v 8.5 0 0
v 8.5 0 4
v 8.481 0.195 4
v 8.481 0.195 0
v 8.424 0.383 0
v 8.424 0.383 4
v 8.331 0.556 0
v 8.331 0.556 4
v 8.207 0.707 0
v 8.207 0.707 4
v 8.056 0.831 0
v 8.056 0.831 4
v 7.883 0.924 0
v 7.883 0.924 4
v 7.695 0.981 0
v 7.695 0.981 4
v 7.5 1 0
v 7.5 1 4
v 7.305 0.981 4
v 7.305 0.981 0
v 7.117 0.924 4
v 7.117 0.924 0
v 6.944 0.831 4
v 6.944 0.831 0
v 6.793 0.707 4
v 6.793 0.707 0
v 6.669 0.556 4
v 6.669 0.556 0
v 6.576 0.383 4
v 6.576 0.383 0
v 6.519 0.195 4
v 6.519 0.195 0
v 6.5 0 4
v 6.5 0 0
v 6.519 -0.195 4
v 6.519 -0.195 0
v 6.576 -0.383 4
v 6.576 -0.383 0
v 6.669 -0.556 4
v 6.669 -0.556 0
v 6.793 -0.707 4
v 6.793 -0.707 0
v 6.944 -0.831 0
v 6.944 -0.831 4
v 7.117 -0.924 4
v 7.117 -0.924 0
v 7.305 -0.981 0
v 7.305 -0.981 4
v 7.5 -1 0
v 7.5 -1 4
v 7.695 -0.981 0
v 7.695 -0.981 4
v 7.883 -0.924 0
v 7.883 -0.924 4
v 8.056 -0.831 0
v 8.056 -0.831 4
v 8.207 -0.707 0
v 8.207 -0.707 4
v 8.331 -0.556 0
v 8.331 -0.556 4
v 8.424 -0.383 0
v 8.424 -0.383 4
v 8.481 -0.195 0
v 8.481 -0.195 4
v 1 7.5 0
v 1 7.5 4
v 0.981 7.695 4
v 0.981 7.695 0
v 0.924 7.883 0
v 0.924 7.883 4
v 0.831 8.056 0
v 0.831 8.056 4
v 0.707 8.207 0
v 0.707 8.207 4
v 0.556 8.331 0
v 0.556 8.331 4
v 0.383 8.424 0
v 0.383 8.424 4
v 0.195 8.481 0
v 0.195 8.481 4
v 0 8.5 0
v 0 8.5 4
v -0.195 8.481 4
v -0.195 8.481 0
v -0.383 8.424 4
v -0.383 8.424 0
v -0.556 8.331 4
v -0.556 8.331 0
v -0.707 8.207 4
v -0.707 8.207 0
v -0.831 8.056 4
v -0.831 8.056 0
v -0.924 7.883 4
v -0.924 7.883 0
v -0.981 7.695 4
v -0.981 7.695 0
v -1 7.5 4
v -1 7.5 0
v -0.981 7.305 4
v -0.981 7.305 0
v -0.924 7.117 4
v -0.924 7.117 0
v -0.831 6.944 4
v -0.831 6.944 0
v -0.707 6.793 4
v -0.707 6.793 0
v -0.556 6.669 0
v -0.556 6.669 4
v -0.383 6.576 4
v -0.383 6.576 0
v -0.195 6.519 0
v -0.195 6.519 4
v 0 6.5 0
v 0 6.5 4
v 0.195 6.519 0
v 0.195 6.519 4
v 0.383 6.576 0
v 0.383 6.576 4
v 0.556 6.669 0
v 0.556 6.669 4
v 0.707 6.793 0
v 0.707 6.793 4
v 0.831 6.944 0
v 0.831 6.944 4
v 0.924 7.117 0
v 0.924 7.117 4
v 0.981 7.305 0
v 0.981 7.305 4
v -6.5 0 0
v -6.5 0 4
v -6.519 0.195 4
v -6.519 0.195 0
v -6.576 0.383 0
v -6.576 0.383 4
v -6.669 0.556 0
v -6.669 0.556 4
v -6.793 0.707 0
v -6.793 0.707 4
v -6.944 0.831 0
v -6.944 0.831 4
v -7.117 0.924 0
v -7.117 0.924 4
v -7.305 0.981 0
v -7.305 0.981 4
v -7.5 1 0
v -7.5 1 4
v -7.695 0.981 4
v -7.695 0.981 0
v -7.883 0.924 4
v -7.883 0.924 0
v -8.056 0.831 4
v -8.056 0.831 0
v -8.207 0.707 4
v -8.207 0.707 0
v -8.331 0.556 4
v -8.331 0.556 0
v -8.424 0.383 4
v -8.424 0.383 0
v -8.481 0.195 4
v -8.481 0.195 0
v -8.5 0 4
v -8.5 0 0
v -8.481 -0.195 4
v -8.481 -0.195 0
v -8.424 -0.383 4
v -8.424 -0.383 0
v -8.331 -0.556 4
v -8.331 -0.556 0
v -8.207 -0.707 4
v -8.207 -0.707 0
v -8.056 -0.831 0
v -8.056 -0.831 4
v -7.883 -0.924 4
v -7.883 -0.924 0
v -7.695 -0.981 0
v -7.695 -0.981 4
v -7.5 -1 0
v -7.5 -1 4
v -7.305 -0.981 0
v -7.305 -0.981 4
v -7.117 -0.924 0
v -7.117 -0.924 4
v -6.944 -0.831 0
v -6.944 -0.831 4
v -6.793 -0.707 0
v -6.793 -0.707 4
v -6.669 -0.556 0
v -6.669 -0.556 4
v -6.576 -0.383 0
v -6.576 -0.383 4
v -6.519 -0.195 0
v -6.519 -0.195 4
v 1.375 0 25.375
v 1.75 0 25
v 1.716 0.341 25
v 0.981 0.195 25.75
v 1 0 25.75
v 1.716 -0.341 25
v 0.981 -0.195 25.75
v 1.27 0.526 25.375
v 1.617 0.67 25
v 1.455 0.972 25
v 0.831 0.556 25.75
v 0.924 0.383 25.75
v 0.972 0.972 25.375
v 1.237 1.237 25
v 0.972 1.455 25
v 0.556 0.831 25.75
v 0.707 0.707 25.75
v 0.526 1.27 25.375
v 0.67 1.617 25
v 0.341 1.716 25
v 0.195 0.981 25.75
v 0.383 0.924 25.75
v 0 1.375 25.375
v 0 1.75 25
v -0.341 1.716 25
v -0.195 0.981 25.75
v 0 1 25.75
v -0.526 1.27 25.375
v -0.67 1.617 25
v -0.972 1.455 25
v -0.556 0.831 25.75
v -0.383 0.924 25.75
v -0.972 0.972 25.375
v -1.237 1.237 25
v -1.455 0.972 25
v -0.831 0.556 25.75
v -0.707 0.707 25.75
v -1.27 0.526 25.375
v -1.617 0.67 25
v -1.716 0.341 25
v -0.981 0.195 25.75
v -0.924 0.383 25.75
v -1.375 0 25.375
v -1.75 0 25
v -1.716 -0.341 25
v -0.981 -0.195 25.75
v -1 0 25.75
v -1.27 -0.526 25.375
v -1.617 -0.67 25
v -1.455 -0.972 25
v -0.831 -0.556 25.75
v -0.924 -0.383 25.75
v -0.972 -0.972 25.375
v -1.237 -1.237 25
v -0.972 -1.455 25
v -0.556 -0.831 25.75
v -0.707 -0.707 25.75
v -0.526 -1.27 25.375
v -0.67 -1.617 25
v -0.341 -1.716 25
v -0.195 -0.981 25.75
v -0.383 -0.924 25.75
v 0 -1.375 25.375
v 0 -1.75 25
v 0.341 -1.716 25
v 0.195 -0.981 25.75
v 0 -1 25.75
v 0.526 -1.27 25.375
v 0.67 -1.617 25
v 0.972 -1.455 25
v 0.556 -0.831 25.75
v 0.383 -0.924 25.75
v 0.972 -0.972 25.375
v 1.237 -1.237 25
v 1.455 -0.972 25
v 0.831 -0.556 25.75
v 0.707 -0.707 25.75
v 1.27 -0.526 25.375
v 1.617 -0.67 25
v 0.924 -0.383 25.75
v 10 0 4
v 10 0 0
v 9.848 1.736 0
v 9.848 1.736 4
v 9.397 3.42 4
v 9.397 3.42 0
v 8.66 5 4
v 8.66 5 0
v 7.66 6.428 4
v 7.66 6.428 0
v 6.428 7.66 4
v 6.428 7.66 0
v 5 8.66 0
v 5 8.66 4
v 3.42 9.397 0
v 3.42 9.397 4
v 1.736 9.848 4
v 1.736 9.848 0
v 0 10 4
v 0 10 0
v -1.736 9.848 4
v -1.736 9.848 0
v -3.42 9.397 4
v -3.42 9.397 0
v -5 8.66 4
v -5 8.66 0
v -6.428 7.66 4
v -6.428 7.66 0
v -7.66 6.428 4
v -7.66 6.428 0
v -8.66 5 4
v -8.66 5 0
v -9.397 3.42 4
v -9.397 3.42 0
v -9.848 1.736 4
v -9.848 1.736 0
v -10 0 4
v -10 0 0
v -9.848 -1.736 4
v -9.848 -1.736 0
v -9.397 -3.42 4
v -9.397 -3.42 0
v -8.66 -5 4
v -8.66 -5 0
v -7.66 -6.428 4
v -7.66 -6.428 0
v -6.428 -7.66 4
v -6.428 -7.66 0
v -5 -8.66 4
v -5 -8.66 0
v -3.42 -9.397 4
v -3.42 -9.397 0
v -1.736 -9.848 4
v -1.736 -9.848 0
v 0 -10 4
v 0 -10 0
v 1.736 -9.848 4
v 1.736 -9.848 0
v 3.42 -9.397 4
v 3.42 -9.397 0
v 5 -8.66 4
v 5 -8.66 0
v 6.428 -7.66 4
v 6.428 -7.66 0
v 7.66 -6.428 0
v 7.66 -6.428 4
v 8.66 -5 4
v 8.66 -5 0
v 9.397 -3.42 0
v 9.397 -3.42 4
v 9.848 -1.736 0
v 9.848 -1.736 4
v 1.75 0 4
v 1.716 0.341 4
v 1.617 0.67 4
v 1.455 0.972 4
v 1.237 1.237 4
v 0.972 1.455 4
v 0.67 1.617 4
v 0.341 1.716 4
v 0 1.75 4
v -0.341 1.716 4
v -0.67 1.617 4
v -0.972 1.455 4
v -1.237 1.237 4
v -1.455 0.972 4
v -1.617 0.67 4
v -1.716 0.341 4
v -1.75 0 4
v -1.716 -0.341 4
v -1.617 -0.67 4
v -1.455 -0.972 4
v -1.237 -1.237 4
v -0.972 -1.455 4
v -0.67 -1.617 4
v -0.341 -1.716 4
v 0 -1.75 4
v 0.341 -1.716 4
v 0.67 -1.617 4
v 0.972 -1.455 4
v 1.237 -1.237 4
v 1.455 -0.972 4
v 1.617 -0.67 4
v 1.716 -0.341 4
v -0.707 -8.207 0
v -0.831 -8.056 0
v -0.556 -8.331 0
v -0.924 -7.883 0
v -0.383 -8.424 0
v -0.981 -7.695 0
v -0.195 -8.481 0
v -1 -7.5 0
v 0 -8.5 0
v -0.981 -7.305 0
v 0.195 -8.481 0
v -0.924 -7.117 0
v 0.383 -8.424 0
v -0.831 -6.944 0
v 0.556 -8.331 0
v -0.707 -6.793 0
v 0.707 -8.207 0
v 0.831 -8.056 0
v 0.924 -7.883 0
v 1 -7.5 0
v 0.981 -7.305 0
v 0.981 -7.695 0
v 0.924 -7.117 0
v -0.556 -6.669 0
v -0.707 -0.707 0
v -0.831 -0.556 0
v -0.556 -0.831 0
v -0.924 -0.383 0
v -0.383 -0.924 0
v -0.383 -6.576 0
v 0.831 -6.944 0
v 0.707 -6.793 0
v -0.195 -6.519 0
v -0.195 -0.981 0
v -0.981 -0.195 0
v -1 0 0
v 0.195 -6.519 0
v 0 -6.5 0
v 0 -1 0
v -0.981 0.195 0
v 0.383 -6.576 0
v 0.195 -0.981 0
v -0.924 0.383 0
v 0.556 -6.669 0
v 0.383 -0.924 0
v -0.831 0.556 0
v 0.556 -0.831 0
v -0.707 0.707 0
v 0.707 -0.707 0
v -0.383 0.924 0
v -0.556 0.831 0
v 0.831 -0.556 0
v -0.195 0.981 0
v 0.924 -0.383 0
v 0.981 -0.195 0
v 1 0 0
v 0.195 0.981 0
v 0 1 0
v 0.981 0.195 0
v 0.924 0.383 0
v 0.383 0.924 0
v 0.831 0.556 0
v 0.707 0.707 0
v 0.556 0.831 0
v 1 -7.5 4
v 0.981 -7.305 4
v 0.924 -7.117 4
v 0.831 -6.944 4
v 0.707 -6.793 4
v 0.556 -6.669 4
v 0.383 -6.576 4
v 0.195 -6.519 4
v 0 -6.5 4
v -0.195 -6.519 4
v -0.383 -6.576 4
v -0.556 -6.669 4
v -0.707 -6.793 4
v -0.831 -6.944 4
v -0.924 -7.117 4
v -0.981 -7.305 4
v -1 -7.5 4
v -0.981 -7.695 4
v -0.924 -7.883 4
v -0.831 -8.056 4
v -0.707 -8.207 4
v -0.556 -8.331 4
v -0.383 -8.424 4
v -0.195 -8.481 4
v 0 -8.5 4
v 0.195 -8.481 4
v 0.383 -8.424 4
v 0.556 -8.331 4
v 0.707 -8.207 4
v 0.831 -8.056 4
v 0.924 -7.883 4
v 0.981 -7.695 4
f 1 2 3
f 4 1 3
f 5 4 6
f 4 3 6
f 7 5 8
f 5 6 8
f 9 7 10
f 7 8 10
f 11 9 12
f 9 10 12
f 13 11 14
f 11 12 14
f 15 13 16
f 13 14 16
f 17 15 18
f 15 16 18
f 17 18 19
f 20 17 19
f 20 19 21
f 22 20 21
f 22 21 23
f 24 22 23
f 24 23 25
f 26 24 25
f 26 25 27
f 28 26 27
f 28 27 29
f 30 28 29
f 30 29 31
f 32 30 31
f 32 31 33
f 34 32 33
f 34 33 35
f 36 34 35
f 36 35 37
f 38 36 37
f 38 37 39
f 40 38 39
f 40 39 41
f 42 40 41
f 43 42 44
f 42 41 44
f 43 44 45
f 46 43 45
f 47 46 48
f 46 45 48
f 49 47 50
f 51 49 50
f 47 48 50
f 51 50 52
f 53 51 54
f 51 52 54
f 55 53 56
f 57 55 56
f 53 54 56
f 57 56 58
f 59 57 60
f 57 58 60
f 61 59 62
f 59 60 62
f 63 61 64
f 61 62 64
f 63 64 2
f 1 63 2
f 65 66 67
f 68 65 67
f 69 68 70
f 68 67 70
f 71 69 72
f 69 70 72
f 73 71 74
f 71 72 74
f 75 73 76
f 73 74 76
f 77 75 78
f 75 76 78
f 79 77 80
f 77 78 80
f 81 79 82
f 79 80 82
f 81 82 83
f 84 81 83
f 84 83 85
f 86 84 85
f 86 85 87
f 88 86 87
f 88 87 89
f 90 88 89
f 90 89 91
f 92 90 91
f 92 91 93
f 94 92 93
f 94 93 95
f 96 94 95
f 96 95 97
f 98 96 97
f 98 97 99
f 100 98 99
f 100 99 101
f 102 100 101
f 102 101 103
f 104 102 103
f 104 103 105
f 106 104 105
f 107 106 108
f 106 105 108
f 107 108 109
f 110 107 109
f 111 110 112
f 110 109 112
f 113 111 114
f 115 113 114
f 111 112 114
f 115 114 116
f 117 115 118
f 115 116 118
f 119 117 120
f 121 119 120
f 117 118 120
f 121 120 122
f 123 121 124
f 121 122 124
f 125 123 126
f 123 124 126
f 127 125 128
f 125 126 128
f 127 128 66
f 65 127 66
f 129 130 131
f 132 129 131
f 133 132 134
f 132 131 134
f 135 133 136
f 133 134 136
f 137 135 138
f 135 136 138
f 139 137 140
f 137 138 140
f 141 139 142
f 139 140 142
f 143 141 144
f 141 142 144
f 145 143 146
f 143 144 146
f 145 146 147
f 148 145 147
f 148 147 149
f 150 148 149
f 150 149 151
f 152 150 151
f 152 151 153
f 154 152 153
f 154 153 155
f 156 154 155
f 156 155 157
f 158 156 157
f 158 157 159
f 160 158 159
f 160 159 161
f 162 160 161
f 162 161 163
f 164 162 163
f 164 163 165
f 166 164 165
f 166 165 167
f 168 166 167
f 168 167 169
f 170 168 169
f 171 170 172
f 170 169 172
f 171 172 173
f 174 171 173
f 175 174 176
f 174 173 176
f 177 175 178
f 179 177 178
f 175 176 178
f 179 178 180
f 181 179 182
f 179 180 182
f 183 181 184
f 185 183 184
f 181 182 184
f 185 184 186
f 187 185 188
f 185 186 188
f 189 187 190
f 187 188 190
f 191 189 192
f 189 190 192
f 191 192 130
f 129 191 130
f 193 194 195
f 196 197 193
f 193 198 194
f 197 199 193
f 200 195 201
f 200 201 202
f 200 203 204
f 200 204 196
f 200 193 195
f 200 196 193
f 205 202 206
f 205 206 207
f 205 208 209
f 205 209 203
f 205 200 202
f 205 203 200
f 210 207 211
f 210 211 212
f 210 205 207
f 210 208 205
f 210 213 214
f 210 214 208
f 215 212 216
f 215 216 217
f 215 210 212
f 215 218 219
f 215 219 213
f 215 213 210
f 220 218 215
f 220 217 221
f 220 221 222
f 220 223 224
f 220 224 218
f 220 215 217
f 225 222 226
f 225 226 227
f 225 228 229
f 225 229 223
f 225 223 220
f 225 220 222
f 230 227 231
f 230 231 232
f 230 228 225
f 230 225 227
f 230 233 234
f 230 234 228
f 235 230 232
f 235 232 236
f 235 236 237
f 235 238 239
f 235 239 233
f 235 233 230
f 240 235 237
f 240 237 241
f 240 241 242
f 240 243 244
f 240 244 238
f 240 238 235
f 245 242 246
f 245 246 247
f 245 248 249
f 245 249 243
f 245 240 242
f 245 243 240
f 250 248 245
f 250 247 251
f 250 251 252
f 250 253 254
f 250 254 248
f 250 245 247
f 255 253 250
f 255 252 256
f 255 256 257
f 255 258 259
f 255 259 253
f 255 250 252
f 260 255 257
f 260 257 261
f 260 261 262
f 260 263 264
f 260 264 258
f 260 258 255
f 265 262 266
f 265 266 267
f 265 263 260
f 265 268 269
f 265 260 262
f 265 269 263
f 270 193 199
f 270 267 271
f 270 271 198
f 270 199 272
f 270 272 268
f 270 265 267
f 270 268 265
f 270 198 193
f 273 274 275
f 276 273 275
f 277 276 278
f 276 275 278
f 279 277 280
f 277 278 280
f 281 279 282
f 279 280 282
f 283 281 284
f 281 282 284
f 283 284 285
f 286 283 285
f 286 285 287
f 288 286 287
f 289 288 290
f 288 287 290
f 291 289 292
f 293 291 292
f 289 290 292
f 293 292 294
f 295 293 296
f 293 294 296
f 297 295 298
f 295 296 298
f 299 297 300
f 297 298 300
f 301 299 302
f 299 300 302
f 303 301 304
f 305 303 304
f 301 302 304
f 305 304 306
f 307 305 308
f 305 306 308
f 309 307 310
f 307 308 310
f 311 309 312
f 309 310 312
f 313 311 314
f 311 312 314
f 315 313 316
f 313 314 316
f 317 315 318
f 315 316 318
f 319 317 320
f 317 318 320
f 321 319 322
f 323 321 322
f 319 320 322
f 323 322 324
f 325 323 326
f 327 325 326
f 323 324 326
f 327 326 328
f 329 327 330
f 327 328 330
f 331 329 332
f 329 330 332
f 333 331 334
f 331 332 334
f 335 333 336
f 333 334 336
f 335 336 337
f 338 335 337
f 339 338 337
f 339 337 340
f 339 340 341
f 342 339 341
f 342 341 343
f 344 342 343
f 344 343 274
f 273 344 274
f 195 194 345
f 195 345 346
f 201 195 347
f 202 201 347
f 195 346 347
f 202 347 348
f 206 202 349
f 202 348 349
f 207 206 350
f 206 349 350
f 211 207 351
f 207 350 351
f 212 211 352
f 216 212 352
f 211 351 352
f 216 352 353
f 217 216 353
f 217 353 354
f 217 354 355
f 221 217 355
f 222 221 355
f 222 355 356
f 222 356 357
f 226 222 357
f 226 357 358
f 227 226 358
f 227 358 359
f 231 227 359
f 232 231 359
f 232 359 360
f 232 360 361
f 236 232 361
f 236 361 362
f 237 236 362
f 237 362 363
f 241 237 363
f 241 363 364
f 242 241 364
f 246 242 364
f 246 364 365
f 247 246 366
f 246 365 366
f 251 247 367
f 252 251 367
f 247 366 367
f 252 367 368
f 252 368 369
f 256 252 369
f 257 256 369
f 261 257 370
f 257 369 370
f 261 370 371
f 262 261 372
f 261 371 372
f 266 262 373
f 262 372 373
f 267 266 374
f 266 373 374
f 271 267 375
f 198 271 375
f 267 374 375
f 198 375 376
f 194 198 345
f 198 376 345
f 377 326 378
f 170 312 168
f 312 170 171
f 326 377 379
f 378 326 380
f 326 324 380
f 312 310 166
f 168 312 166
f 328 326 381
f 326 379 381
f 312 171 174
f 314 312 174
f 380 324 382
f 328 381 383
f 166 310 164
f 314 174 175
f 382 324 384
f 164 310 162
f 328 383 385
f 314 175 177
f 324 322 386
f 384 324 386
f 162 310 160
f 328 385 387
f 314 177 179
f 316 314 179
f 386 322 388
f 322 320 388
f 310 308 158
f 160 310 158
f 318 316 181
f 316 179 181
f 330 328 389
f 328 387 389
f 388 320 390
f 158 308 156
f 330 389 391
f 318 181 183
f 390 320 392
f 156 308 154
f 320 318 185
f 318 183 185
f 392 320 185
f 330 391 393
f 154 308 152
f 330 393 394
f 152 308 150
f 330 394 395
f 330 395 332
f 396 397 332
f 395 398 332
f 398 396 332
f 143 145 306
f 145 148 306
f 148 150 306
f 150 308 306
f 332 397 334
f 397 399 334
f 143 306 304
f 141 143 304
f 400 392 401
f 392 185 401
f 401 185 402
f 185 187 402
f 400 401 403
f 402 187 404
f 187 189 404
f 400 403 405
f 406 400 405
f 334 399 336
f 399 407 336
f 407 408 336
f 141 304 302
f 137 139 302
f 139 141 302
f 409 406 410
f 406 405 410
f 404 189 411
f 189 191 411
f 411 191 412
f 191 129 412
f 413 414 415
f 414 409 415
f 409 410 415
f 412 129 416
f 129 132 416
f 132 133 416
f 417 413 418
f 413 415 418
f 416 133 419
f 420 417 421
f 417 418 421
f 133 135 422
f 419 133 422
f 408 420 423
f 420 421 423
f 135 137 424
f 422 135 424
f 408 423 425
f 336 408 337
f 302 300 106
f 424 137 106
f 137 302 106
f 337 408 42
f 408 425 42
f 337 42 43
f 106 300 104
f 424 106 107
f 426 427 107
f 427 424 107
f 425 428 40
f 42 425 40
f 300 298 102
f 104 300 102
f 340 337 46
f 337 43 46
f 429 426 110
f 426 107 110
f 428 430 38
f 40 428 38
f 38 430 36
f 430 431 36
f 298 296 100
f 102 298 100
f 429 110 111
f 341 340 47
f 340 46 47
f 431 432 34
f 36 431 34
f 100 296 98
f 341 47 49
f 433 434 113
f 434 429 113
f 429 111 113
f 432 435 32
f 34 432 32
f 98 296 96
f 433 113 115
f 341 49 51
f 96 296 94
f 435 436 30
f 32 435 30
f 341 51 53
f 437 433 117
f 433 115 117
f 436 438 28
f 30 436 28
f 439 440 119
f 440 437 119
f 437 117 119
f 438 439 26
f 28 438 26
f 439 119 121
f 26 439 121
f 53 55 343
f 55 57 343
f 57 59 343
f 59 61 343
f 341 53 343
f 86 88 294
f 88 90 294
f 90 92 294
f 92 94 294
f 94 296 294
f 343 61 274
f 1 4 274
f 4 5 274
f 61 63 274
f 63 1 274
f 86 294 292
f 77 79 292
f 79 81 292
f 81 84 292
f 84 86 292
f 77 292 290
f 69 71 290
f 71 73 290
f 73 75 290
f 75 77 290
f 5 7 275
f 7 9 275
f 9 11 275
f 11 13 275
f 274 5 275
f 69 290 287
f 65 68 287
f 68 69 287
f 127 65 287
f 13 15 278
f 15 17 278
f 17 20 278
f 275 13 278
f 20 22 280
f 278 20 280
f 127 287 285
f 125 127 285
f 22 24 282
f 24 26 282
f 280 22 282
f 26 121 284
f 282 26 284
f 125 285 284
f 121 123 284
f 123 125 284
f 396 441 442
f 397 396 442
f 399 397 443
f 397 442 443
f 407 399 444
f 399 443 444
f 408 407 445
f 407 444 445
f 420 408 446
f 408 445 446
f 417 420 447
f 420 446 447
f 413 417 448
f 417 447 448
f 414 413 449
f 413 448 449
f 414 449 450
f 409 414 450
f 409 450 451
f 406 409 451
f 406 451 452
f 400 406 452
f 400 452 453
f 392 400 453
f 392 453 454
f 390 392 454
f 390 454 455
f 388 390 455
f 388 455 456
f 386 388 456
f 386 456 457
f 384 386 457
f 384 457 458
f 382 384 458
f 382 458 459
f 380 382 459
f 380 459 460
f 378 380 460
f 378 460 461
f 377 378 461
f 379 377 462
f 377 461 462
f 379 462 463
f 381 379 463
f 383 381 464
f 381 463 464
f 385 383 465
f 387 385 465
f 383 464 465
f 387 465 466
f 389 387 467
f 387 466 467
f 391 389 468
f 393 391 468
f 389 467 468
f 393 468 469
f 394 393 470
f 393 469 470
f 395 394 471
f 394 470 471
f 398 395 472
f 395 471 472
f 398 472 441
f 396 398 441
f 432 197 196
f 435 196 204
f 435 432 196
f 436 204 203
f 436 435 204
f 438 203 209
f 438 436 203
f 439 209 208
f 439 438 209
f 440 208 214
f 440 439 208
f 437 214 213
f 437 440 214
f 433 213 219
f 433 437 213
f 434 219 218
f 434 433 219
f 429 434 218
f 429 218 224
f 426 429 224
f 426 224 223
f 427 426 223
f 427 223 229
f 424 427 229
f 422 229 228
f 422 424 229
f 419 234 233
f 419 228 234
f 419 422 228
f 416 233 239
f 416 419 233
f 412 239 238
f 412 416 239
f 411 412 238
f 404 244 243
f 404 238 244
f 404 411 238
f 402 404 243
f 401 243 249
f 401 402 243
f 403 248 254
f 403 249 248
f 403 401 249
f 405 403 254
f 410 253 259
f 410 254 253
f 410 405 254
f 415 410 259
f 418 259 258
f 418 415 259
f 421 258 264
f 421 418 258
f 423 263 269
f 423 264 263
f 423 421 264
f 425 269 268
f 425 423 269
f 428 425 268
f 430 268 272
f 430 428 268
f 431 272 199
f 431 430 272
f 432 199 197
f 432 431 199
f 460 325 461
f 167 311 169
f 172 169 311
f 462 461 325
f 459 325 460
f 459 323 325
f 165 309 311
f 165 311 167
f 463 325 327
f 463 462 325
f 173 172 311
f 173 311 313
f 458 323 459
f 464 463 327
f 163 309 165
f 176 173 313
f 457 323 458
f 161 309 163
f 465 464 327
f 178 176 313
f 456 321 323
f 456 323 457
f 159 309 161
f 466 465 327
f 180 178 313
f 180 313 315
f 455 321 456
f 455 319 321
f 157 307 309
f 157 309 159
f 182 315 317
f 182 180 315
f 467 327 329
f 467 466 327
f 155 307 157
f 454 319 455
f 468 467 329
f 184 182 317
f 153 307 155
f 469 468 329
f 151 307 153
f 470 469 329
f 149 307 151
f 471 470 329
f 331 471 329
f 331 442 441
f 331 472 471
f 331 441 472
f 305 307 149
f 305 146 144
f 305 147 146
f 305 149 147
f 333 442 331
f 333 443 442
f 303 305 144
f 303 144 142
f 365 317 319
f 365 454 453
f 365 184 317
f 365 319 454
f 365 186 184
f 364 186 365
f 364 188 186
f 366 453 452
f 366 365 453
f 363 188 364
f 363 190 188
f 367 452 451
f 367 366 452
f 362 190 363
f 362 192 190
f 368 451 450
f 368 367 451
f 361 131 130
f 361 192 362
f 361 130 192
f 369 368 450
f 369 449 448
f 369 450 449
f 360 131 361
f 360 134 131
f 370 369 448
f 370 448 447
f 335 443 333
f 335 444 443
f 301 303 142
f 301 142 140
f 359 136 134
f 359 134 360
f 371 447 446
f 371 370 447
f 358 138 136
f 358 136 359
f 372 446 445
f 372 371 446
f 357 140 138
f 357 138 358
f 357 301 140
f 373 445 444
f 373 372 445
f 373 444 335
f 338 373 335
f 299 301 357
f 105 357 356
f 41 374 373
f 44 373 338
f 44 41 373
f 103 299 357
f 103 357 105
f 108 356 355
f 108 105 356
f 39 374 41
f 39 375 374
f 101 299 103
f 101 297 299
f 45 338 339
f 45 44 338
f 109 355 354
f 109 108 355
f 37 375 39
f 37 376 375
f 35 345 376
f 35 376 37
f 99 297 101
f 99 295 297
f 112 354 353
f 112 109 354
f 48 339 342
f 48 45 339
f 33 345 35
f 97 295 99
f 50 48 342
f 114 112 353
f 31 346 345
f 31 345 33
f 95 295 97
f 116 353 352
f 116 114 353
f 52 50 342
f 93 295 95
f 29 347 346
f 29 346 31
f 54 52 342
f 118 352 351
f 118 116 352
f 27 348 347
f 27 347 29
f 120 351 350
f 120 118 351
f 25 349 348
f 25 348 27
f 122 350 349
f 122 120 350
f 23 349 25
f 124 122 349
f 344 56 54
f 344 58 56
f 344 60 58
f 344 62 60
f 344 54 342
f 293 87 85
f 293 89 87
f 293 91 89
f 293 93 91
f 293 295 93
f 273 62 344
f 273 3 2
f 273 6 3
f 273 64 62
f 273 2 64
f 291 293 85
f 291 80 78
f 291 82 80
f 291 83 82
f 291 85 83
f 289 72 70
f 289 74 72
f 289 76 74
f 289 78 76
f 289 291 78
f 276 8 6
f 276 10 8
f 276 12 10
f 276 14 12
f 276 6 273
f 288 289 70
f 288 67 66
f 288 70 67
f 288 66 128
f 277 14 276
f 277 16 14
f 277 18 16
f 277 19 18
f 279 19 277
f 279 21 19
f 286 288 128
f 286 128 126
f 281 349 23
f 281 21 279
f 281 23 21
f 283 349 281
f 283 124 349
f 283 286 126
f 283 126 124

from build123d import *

# Parameters (mm, degrees)
SKETCH1_R           = 10
SKETCH1_R_2         = 1
BOSS_EXTRUDE1_DEPTH = 4
SKETCH2_R           = 1.75
SKETCH2_R_2         = 1
BOSS_EXTRUDE2_DEPTH = 22
CHAMFER1_SIZE       = 1
SKETCH3_R           = 1
CUT_EXTRUDE1_DEPTH  = 26.943448113


with BuildPart() as part:
    # Sketch1 → Boss-Extrude1 (new body)
    with BuildSketch(Plane.XY):
        Circle(SKETCH1_R)
        Circle(SKETCH1_R_2, mode=Mode.SUBTRACT)
    extrude(amount=BOSS_EXTRUDE1_DEPTH)

    # Sketch2 → Boss-Extrude2 (add)
    with BuildSketch(Plane.XY.offset(4)):
        Circle(SKETCH2_R)
        Circle(SKETCH2_R_2, mode=Mode.SUBTRACT)
    extrude(amount=BOSS_EXTRUDE2_DEPTH)

    # Chamfer1
    # the kernel refuses this chamfer: 1 mm, written as the material it takes off along each edge
    with BuildSketch(Plane(origin=(0, 0, 26), x_dir=(1, 0, 0), z_dir=(0, -1, 0))) as chamfer1_piece_1:
        Polygon((1.75, -CHAMFER1_SIZE), (1.75 - CHAMFER1_SIZE, 0), (1.75, 0), align=None)
    revolve(axis=Axis((0, 0, 26), (0, 0, 1)), mode=Mode.SUBTRACT)

    # Sketch3 → Cut-Extrude1 (cut, through all)
    with BuildSketch(Plane.XY.offset(4)):
        with Locations((0, 7.5)):
            Circle(SKETCH3_R)
        with Locations((-7.5, 0)):
            Circle(SKETCH3_R)
        with Locations((7.5, 0)):
            Circle(SKETCH3_R)
        with Locations((0, -7.5)):
            Circle(SKETCH3_R)
    extrude(amount=-CUT_EXTRUDE1_DEPTH, mode=Mode.SUBTRACT)


solid = part.part
